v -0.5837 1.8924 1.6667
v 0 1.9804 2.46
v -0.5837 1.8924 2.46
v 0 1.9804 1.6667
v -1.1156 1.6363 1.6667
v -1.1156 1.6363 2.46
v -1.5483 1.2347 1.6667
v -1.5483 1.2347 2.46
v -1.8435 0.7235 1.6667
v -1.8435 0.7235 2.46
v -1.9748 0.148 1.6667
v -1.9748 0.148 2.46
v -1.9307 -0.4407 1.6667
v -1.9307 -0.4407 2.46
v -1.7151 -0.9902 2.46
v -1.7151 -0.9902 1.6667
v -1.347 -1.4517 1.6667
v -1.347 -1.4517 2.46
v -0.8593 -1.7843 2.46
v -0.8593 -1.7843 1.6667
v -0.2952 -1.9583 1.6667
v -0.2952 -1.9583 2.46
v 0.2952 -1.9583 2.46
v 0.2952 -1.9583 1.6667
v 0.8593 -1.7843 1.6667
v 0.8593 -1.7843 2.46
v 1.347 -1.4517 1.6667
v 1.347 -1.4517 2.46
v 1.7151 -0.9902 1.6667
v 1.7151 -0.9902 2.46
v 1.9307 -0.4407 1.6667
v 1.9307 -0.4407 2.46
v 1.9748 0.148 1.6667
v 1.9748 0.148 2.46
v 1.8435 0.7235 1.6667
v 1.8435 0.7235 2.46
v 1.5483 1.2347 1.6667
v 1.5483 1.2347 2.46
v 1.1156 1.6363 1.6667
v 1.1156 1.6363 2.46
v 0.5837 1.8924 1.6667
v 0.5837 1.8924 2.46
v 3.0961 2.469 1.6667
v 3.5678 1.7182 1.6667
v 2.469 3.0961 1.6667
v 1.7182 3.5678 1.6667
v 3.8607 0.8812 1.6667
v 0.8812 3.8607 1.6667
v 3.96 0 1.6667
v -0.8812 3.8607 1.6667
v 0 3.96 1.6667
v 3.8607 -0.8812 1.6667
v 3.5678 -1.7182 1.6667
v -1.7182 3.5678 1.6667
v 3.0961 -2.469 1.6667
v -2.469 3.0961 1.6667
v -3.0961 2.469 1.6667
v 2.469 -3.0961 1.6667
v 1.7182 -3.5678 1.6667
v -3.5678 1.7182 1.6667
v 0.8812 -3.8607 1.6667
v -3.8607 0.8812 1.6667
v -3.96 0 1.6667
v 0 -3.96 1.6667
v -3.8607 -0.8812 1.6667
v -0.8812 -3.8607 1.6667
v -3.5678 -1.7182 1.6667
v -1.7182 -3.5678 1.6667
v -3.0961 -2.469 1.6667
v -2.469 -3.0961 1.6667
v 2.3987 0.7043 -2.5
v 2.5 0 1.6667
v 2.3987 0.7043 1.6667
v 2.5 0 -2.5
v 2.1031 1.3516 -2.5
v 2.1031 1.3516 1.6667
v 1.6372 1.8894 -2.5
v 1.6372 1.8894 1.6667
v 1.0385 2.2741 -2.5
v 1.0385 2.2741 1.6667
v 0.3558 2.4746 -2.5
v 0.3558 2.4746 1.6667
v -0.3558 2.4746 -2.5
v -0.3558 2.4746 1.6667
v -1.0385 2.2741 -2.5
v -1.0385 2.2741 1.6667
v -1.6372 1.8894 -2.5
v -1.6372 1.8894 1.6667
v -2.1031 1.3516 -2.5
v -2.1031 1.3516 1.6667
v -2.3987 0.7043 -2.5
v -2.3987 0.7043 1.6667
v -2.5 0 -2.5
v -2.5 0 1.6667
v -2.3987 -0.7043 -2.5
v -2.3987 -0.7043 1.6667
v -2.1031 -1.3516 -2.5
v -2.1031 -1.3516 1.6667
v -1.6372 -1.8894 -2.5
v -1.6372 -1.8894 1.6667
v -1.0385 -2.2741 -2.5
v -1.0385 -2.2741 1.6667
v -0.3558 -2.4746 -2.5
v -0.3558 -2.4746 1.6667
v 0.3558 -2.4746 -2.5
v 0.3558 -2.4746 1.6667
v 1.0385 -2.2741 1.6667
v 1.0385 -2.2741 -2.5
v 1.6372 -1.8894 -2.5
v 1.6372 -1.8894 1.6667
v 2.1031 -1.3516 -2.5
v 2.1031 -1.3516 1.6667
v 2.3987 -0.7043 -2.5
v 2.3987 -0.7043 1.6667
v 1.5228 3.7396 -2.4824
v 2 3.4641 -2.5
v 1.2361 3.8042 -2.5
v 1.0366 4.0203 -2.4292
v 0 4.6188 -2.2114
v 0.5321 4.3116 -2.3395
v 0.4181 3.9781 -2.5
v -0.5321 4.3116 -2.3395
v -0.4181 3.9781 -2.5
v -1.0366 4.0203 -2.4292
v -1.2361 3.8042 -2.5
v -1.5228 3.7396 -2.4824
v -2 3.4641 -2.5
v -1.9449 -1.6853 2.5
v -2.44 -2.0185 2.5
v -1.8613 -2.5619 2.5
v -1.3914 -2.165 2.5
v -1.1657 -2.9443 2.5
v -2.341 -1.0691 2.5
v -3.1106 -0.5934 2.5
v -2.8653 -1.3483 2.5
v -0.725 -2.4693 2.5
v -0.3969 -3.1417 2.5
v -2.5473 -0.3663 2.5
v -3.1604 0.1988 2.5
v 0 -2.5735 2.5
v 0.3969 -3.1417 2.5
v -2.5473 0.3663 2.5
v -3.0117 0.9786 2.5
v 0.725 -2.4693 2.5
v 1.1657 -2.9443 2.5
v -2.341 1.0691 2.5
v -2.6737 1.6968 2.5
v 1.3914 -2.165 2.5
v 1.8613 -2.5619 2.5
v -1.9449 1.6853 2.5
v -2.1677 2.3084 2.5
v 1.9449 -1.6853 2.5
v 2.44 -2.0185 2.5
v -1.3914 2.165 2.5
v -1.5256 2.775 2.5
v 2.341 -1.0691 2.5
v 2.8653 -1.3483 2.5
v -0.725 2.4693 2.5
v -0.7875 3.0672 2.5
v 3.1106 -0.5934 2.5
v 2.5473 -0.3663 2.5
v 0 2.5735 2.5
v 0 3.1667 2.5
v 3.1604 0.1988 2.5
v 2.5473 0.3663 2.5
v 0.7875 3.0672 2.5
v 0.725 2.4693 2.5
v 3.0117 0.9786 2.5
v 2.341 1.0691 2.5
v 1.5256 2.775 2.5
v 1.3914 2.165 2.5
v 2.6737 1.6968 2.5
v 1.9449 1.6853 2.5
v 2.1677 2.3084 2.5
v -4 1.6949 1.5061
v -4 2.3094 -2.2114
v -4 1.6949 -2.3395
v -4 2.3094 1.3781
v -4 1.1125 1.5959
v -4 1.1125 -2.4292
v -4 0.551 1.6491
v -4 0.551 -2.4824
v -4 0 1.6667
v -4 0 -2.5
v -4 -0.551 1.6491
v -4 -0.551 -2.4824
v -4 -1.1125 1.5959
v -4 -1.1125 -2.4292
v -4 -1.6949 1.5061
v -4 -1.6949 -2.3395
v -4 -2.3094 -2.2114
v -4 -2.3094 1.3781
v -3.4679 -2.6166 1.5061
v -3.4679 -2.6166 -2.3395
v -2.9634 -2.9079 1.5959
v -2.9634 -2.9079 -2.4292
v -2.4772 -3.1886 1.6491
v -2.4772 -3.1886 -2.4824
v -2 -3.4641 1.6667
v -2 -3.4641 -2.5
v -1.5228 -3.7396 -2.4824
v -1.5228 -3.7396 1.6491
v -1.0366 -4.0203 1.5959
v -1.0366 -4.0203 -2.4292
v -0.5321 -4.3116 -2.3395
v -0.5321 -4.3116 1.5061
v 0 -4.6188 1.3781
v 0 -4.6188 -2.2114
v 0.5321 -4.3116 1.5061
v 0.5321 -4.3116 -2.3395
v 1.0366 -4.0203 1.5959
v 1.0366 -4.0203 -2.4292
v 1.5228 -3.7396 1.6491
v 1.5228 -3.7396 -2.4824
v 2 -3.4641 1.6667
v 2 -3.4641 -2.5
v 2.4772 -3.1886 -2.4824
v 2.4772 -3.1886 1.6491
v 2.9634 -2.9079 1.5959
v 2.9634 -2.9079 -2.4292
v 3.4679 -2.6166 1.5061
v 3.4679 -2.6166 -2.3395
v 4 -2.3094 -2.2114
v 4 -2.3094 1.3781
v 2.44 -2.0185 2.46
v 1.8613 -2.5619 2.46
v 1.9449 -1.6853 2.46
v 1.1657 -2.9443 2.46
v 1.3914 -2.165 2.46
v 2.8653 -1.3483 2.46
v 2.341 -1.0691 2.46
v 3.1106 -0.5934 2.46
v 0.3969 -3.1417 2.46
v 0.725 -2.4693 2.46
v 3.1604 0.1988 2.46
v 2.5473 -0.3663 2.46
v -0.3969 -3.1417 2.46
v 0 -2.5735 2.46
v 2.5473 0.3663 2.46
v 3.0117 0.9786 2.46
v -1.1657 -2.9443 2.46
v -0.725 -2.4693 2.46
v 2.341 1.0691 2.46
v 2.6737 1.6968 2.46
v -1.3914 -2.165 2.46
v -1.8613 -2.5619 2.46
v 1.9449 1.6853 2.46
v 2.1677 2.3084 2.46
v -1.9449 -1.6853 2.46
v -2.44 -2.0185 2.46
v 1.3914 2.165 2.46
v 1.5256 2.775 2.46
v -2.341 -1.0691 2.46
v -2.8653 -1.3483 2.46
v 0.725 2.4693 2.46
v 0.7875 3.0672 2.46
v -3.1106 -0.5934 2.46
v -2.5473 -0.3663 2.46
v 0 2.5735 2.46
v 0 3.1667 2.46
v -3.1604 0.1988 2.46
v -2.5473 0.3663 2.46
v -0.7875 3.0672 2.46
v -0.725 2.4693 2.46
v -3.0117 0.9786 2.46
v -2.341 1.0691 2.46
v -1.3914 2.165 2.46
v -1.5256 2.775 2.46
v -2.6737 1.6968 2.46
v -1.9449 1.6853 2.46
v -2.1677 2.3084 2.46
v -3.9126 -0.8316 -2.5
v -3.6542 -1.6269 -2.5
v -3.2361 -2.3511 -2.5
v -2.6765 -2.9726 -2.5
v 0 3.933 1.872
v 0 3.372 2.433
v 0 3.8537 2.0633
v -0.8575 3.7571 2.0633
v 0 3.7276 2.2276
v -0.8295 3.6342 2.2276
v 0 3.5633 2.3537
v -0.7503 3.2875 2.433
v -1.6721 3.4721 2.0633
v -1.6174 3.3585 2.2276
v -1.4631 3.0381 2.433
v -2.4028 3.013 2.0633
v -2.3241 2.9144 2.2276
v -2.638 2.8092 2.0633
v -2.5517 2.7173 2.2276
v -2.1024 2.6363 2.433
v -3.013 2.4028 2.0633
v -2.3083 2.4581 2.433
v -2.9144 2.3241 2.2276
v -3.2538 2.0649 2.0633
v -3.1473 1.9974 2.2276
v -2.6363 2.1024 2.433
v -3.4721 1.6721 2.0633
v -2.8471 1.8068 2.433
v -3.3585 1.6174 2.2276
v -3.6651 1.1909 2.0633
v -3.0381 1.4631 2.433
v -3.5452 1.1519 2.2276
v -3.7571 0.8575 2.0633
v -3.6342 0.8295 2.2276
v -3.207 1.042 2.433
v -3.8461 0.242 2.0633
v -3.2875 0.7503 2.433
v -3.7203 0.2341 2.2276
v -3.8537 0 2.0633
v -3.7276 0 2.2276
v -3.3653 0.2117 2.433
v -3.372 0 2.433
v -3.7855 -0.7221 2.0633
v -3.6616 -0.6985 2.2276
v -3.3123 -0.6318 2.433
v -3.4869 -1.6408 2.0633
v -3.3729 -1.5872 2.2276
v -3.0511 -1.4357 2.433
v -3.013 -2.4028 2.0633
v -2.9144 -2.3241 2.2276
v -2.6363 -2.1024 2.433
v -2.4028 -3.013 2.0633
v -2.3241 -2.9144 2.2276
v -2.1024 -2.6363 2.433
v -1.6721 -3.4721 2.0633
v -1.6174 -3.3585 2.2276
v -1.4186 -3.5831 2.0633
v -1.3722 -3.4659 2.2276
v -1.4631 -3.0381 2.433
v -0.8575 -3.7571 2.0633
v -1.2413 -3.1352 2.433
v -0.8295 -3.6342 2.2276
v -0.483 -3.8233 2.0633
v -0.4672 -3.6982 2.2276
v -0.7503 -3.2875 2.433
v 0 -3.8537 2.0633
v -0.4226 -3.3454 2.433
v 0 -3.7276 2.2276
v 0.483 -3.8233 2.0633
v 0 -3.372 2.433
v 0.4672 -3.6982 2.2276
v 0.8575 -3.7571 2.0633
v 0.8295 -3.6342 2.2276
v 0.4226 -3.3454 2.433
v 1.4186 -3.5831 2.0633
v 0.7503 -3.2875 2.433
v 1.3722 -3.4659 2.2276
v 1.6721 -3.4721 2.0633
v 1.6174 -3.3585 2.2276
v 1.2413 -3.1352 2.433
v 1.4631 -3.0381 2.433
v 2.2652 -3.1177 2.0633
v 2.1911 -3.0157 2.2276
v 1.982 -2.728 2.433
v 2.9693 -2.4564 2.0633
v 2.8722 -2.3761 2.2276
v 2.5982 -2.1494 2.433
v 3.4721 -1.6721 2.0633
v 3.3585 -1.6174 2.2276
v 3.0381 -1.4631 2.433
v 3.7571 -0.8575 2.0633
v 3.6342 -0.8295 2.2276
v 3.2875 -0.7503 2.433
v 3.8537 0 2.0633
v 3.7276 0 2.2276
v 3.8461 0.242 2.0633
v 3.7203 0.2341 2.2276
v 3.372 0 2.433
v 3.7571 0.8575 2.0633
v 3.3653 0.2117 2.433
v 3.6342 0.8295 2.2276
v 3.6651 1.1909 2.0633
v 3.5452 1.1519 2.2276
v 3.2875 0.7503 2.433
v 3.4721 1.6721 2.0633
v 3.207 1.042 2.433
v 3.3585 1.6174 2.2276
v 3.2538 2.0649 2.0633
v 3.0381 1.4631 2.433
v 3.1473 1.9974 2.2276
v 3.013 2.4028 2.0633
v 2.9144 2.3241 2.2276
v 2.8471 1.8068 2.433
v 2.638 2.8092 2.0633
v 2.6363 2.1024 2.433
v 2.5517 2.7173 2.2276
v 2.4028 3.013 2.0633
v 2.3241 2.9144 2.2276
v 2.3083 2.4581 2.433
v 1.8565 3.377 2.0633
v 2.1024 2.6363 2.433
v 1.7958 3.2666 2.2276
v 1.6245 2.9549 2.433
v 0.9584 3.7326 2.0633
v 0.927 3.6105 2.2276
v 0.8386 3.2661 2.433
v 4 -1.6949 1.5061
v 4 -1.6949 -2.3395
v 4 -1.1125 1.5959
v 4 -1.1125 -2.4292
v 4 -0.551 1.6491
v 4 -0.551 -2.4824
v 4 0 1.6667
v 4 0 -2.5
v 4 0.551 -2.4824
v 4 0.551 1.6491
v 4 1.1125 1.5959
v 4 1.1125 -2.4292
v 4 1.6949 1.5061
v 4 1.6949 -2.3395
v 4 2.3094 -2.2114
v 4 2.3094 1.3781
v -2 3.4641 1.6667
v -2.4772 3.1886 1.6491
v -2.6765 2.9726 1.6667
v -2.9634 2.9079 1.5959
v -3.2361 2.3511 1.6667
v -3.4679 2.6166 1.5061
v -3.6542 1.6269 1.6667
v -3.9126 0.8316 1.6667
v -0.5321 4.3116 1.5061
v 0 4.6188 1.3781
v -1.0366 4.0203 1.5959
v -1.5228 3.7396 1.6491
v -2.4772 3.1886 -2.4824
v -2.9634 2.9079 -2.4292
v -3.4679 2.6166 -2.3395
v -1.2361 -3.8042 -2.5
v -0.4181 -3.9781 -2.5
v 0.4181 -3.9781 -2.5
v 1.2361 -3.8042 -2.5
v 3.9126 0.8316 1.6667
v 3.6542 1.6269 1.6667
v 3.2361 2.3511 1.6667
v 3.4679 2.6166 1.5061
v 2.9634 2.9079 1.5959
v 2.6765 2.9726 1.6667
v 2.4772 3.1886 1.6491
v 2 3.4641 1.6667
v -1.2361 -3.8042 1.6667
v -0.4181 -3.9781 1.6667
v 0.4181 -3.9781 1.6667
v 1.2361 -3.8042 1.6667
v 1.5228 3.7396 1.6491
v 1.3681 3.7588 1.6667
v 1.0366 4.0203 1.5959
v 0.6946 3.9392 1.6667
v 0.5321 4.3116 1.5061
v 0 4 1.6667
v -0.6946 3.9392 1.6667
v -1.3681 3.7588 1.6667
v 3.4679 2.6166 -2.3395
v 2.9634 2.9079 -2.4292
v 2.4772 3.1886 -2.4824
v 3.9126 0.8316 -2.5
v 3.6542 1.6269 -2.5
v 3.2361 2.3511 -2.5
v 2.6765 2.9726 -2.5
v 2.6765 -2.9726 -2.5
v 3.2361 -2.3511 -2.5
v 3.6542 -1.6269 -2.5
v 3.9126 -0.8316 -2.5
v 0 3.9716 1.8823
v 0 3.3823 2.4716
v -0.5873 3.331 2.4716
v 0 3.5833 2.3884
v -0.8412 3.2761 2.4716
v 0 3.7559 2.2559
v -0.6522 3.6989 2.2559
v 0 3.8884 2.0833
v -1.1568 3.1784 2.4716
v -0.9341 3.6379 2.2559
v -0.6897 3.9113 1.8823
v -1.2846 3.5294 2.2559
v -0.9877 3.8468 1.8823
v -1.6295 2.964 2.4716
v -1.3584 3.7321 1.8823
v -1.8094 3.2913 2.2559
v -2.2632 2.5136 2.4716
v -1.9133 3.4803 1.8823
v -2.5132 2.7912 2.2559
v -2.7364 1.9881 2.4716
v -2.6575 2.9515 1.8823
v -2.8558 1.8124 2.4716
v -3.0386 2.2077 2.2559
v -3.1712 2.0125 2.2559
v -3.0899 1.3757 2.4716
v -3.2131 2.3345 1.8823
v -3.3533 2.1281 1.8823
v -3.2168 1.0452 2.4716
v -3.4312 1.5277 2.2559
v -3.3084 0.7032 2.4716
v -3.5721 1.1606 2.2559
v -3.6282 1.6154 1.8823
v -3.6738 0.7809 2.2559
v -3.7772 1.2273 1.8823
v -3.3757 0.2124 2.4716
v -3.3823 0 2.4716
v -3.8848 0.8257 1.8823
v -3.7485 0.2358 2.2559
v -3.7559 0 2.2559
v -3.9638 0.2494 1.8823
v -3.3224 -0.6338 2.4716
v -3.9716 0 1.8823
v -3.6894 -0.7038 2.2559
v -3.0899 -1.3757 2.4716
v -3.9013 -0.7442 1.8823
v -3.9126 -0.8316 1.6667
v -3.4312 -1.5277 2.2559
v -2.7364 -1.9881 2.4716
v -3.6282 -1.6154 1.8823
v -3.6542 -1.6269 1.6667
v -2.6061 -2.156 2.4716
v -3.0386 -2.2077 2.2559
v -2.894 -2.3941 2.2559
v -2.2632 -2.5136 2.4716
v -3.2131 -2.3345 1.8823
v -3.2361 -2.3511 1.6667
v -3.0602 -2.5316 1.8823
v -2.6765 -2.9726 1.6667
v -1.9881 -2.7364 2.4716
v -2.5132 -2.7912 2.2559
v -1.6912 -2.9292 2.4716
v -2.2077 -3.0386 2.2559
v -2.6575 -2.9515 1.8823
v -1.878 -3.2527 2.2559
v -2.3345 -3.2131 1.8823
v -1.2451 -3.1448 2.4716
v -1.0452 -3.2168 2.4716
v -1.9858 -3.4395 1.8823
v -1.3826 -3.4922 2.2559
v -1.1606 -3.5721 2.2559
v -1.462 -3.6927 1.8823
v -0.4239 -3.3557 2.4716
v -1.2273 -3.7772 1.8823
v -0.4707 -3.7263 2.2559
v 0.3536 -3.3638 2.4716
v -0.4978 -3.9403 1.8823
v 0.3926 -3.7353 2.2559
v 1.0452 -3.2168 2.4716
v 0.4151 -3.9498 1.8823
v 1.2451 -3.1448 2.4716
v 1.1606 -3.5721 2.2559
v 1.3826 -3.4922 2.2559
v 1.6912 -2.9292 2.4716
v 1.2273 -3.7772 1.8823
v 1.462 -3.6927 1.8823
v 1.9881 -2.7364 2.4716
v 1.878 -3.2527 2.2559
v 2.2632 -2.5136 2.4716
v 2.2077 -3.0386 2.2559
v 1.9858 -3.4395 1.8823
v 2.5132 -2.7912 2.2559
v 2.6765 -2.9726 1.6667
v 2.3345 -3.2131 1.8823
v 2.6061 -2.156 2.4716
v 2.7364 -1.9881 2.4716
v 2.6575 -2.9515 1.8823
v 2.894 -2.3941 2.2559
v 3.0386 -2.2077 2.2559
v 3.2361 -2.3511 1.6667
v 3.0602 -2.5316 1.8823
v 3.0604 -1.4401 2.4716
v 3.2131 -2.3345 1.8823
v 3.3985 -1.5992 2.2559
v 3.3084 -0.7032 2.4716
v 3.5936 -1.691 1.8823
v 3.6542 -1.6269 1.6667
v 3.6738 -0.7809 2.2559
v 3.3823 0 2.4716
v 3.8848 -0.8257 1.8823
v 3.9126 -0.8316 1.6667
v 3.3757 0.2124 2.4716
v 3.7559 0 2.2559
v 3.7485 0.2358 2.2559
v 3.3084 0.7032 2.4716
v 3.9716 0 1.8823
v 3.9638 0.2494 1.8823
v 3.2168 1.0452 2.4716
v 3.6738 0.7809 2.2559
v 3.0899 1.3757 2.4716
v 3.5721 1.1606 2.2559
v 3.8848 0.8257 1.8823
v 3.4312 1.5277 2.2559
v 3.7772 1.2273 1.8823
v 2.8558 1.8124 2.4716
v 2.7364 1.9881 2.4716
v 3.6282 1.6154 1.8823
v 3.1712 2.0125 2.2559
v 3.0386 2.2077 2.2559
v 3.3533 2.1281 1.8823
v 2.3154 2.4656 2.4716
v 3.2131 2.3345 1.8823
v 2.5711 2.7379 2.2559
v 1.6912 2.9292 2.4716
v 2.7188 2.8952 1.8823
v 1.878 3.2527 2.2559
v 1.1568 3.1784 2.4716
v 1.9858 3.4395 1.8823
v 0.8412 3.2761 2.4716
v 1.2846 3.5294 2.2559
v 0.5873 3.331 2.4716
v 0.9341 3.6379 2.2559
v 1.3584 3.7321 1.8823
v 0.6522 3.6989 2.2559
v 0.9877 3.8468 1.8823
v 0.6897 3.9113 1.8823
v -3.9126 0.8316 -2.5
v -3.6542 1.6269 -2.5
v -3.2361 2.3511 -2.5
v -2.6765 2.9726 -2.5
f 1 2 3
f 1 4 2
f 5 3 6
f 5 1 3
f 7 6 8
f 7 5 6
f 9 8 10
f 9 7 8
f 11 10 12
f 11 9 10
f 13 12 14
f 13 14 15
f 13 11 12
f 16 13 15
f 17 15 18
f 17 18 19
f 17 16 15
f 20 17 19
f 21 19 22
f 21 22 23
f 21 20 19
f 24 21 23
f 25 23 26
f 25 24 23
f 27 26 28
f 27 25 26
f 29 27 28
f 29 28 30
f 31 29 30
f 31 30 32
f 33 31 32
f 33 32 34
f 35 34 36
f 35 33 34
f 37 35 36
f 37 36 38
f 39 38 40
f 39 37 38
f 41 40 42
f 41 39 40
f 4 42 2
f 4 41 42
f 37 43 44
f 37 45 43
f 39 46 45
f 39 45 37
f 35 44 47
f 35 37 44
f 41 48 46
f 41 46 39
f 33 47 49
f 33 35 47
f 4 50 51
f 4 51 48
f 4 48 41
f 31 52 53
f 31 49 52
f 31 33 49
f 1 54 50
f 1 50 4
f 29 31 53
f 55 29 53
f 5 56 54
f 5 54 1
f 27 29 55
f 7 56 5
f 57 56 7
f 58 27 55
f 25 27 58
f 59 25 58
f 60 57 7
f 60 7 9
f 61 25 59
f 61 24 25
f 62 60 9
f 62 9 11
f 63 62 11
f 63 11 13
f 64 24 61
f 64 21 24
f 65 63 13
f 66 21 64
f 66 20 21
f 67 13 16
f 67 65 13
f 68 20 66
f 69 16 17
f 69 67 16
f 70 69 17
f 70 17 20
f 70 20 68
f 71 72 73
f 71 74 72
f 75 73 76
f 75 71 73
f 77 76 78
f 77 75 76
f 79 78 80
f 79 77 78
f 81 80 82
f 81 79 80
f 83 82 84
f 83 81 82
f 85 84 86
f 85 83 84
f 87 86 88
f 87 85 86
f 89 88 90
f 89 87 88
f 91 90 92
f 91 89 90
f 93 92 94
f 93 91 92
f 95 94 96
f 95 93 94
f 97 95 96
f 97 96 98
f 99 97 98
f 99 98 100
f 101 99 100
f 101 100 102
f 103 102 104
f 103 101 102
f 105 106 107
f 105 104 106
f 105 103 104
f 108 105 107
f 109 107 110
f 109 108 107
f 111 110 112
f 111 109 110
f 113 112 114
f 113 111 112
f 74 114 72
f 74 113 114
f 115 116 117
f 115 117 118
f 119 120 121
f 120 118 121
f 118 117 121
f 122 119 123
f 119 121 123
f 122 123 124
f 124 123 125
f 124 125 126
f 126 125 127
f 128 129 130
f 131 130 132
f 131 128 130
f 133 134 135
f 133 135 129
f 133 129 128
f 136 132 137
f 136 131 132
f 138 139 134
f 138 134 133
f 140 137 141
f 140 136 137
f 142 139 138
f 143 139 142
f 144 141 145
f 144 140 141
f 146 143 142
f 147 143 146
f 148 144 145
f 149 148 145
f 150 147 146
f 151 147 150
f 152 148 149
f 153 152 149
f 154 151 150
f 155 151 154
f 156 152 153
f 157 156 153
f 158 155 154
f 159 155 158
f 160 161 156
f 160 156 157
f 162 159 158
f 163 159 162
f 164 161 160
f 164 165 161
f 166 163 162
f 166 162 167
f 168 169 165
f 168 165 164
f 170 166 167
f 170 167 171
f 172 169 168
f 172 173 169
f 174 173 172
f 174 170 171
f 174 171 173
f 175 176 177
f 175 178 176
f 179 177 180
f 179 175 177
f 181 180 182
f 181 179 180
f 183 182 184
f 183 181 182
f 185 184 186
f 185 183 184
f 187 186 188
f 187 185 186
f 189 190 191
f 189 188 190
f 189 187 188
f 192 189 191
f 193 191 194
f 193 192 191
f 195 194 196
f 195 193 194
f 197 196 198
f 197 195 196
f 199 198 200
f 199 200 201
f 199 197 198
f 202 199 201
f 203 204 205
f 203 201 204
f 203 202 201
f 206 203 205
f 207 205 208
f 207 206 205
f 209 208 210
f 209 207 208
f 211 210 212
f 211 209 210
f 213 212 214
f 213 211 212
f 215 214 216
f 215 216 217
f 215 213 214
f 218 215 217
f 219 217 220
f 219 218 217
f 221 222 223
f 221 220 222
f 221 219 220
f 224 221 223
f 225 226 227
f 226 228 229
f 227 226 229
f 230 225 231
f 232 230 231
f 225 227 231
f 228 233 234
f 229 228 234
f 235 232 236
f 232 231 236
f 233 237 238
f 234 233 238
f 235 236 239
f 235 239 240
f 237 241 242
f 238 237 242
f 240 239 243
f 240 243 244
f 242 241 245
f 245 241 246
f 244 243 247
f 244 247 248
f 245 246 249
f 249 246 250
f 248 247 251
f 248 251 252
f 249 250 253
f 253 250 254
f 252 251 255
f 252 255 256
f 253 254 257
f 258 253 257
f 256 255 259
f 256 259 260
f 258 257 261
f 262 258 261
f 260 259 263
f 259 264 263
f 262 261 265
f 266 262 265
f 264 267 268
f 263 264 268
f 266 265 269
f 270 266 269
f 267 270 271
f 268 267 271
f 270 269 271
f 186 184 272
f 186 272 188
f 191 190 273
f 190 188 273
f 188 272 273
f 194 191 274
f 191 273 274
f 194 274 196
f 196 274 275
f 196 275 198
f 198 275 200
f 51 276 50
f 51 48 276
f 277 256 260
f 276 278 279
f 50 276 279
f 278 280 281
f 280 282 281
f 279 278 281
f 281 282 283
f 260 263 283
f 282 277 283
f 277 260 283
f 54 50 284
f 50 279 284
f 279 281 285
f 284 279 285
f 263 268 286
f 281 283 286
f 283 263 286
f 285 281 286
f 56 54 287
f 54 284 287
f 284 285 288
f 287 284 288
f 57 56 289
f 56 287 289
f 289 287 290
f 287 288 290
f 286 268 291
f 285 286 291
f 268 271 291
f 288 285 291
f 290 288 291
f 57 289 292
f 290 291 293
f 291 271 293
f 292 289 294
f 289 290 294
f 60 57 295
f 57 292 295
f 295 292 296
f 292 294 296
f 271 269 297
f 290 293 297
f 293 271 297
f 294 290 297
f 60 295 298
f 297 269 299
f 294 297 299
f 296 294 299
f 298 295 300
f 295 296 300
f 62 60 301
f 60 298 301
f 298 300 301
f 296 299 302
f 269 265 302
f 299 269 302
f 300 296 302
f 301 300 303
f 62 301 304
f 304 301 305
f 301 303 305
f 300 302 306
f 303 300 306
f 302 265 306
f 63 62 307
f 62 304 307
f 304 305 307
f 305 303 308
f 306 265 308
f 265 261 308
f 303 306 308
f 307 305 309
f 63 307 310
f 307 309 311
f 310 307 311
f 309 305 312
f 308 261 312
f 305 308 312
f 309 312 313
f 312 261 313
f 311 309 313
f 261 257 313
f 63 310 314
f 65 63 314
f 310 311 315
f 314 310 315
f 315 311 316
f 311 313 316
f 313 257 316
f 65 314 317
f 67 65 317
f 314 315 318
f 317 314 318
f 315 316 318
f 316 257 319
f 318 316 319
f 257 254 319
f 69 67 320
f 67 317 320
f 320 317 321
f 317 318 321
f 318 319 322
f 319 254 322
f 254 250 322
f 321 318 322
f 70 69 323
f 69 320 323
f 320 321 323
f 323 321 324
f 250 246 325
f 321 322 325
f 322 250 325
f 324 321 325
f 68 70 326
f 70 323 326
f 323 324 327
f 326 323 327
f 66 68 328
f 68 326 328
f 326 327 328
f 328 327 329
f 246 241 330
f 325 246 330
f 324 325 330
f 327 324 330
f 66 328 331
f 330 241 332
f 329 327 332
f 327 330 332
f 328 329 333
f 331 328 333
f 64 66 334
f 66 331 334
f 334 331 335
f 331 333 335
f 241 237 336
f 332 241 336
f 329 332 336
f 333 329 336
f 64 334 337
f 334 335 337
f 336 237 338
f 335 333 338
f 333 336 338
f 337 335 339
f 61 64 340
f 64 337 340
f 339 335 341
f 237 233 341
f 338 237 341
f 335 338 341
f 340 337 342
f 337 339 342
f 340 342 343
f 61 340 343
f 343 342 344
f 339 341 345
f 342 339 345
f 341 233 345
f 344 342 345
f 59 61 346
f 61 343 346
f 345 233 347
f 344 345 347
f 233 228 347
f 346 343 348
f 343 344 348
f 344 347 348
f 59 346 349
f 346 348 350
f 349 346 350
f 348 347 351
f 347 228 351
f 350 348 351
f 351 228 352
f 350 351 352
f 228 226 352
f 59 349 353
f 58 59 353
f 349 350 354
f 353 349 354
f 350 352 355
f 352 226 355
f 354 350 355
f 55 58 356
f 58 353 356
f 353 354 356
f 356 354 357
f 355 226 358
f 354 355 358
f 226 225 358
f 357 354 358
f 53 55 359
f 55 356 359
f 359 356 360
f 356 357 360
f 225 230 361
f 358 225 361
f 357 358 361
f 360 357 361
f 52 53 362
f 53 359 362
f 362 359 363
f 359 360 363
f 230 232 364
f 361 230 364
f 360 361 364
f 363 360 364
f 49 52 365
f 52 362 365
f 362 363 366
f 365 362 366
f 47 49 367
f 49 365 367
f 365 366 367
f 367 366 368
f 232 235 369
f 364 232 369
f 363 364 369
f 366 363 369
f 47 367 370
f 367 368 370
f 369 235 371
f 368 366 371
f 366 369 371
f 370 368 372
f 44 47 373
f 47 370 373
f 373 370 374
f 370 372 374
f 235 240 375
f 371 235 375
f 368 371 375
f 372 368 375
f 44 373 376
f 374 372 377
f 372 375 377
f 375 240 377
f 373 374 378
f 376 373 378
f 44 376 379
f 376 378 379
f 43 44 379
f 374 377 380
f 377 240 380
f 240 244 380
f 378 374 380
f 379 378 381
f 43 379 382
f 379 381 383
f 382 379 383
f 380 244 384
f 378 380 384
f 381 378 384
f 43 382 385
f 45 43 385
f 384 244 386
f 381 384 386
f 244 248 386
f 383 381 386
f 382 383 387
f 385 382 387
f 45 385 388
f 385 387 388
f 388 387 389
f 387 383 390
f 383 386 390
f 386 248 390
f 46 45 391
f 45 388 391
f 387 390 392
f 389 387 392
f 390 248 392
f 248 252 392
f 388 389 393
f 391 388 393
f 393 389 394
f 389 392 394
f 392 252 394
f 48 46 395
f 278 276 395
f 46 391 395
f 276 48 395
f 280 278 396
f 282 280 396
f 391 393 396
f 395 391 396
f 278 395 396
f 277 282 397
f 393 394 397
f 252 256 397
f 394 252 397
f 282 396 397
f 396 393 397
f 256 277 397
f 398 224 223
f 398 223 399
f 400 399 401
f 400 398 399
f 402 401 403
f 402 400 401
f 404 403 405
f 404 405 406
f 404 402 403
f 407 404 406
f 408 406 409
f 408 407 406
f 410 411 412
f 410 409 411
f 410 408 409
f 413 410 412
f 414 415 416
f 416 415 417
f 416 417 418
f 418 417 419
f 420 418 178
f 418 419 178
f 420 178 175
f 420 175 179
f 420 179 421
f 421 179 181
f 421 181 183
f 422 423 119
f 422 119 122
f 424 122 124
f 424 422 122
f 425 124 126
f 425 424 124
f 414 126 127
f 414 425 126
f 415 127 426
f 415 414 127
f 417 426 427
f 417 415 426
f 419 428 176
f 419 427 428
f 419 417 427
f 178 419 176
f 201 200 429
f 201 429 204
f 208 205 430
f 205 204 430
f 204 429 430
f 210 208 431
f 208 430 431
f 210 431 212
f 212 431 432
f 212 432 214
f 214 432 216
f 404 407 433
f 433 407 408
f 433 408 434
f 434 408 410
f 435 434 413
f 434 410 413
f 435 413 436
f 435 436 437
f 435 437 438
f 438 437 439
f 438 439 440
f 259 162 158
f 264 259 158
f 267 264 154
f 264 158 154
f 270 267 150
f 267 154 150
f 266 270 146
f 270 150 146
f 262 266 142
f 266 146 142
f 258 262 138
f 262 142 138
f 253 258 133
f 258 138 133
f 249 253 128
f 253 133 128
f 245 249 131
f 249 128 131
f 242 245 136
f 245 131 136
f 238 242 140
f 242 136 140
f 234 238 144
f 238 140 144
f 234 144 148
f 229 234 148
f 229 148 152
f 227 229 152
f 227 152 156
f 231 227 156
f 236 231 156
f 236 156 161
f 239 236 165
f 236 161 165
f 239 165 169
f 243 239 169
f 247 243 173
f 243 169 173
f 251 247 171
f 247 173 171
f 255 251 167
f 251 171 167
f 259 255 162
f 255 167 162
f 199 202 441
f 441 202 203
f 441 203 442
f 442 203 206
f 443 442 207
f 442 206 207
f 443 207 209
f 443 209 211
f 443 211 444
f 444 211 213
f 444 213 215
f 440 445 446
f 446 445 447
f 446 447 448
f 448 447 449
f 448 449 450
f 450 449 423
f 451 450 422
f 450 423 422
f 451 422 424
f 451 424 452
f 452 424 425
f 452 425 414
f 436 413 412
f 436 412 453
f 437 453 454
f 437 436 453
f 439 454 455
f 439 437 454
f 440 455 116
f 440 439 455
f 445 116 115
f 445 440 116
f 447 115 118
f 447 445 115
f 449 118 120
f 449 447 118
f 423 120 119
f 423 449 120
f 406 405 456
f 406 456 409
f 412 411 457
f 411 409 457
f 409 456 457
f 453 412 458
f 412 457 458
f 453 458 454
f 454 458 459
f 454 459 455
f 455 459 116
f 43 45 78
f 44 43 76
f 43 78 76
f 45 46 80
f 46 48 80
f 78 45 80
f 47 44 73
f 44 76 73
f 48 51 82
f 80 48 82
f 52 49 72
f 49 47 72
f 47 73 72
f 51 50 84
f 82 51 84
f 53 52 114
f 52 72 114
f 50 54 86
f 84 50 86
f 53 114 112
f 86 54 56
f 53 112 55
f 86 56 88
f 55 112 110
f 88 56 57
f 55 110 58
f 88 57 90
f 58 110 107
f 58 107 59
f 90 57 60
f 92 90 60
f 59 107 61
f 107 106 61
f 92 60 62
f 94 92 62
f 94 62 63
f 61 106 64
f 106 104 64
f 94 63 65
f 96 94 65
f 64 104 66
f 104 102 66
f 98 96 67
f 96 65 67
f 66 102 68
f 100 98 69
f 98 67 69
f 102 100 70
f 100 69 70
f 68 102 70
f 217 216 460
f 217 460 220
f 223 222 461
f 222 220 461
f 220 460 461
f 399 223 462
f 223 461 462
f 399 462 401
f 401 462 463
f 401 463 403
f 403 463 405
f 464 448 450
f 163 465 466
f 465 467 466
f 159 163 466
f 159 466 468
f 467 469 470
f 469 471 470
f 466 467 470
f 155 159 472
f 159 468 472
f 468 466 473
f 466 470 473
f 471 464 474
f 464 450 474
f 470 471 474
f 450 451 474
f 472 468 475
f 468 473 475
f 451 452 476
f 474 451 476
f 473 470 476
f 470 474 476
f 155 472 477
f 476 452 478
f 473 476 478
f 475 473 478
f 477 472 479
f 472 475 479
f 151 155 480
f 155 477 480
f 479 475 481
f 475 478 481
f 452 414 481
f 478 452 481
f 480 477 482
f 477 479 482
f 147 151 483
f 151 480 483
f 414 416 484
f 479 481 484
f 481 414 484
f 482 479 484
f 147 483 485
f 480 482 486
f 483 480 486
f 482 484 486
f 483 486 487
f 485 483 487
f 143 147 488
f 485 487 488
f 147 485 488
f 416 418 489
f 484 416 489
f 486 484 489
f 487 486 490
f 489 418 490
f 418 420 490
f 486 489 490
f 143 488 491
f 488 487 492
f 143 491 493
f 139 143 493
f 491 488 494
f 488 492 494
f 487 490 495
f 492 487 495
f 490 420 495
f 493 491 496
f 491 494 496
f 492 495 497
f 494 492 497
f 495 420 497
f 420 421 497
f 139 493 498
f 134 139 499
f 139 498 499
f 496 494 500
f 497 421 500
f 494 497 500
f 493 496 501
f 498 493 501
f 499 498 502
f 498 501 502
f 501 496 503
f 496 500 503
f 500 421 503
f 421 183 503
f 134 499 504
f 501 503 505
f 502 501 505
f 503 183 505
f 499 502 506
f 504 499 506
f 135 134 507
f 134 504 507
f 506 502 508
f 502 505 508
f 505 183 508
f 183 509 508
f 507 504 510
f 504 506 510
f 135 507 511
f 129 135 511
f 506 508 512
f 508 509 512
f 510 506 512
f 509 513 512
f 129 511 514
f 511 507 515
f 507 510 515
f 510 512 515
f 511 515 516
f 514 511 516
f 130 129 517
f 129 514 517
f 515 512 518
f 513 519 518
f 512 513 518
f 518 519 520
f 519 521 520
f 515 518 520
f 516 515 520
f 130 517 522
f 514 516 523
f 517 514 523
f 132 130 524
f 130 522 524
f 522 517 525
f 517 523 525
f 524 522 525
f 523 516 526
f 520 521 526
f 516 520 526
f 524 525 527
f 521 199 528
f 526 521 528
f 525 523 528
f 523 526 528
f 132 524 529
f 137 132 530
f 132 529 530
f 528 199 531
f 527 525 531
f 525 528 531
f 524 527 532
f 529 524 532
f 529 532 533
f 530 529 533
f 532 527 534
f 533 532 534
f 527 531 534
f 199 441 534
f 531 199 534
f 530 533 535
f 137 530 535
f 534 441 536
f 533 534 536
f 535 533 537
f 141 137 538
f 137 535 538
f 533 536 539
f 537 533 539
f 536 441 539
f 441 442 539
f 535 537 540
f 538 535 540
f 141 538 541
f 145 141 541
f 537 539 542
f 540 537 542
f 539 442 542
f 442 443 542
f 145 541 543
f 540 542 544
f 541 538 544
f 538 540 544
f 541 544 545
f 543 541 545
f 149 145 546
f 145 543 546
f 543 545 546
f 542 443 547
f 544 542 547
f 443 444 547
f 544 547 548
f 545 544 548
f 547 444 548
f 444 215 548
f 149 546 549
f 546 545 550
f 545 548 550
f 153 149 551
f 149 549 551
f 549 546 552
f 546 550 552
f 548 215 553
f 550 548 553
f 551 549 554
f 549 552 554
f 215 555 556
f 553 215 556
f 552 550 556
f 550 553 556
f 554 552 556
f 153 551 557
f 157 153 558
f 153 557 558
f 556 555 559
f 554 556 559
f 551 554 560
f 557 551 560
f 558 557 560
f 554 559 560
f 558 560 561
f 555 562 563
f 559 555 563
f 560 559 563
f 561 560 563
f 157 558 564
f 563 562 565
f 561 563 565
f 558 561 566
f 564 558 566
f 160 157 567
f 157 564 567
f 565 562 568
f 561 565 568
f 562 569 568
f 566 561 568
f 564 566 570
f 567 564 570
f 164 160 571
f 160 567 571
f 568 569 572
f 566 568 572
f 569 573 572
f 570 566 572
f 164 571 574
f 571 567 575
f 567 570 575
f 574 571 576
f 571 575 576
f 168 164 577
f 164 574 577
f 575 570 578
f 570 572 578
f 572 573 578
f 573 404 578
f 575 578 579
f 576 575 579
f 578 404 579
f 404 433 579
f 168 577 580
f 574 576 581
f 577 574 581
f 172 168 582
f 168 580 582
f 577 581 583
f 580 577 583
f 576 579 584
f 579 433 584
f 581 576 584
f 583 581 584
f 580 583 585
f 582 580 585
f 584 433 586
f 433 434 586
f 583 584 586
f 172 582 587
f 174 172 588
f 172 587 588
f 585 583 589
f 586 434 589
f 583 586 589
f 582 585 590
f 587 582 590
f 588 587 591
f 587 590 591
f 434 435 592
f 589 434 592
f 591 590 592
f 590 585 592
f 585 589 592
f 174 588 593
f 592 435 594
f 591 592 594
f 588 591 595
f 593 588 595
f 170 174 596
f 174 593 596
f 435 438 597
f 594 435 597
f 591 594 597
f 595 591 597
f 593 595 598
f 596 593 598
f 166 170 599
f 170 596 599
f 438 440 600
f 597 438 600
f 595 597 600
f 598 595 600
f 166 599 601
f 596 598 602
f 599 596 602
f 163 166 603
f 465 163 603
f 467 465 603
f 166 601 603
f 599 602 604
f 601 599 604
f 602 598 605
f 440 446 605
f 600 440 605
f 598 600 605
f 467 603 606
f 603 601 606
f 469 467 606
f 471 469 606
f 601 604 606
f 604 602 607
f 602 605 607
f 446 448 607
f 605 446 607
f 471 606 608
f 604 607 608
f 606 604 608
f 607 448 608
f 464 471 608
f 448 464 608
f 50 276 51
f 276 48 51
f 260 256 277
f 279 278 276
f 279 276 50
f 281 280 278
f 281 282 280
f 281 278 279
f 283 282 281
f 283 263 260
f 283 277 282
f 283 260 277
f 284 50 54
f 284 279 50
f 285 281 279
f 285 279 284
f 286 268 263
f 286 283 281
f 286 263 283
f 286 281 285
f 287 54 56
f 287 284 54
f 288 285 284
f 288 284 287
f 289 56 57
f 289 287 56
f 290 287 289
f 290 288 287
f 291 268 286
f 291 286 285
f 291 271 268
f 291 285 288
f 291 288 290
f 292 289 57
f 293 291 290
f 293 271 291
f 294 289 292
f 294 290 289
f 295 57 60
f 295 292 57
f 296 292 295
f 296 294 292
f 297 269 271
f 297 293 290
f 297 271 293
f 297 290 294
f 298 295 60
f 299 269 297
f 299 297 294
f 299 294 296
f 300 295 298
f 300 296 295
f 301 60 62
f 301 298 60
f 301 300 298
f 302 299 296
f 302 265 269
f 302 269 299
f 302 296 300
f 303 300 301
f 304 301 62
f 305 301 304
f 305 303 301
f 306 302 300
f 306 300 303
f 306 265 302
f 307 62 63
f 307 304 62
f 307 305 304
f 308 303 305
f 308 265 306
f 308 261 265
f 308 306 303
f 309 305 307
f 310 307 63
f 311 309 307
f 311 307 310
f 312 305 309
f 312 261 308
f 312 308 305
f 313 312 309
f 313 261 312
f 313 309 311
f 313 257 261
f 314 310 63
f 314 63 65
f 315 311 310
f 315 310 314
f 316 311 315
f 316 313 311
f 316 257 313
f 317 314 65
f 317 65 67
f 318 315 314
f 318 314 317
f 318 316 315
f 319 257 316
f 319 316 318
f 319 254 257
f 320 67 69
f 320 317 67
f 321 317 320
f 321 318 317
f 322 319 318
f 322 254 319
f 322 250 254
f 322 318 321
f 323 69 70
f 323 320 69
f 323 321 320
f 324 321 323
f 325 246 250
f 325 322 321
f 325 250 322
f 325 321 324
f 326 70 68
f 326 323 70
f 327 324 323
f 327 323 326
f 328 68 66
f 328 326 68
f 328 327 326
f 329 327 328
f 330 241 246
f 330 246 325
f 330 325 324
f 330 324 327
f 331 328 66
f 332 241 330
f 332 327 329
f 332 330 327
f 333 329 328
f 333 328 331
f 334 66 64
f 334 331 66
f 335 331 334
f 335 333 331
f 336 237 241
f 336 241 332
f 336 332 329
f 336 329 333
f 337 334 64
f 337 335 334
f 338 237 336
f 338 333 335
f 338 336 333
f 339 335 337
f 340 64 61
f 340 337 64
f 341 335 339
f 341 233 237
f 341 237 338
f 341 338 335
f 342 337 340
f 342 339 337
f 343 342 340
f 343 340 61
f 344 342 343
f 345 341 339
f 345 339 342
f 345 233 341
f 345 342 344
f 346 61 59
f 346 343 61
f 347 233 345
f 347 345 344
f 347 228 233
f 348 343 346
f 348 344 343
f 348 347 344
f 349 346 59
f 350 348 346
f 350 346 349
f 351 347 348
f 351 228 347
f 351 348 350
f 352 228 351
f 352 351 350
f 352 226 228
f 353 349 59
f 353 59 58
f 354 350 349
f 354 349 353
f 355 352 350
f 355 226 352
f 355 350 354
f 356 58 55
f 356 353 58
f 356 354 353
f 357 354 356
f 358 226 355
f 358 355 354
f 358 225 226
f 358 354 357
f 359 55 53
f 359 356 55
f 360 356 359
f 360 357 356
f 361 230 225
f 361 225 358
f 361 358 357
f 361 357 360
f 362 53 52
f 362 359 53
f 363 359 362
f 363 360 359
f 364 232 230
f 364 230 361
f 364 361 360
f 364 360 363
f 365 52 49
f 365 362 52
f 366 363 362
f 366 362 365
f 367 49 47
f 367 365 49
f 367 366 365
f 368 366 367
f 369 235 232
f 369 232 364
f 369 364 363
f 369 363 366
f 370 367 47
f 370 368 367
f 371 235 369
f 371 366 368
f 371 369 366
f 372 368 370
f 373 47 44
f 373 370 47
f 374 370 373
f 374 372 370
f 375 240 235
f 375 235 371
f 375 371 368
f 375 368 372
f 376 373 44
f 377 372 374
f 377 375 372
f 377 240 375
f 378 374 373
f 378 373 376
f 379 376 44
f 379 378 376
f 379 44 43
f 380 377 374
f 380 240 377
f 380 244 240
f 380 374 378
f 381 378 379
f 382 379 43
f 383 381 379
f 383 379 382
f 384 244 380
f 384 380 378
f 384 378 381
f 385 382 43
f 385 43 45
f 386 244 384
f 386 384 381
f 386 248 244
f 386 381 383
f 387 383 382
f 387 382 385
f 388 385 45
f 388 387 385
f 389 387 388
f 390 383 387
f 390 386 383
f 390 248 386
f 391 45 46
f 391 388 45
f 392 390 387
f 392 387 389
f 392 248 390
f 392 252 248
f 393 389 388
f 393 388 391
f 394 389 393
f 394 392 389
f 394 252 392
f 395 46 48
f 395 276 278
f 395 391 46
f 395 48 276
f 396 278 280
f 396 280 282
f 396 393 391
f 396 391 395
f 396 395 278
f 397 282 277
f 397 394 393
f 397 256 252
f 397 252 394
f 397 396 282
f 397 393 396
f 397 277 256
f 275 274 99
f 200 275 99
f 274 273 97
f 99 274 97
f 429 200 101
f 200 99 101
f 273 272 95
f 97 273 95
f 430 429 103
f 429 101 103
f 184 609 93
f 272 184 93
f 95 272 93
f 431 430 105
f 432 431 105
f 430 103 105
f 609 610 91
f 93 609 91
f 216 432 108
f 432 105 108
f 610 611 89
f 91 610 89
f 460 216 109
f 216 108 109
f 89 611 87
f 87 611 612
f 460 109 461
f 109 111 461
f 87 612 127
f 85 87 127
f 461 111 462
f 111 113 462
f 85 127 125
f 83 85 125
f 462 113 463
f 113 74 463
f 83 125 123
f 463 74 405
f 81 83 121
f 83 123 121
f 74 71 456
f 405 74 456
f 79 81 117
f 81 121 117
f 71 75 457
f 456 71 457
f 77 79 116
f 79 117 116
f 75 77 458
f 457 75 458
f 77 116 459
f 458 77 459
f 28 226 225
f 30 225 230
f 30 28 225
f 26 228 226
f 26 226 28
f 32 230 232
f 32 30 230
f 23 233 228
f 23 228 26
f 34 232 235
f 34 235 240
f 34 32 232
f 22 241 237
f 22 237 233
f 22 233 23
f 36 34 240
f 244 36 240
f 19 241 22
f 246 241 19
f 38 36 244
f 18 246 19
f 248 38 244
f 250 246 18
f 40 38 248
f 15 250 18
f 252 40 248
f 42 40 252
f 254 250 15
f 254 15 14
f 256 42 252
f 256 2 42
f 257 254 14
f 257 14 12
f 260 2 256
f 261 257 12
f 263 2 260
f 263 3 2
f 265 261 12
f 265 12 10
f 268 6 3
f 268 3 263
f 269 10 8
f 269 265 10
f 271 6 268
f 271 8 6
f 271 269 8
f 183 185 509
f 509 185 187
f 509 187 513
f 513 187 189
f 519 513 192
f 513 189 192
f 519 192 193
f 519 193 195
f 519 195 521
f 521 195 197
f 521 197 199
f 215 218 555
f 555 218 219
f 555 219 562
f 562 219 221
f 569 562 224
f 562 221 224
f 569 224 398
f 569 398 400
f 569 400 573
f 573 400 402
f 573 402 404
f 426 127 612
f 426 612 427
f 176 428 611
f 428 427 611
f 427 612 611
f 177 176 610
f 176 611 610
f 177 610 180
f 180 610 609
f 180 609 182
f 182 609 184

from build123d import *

# Parameters (mm, degrees)
SKETCH3_R           = 2.5
BOSS_EXTRUDE1_DEPTH = 2.5


with BuildPart() as part:
    # Sketch3 → Boss-Extrude1 (new, symmetric)
    with BuildSketch(Plane.XY):
        Polygon((0, -4.618802154), (4, -2.309401077), (4, 2.309401077), (0, 4.618802154), (-4, 2.309401077), (-4, -2.309401077), align=None)
        Circle(SKETCH3_R, mode=Mode.SUBTRACT)
    extrude(amount=BOSS_EXTRUDE1_DEPTH, both=True)

    # Sketch4 → Cut-Revolve1 (revolve, cut)
    with BuildSketch(Plane(origin=(0, 0, 0), x_dir=(0, 0, -1), z_dir=(1, 0, 0))):
        with BuildLine():
            Line((3.77, 5.888802154), (-3.77, 5.888802154))
            Line((-3.77, 5.888802154), (-3.77, 3.166666667))
            Line((-3.77, 3.166666667), (-2.5, 3.166666667))
            ThreePointArc((-2.5, 3.166666667), (-2.255922318, 3.755922318), (-1.666666667, 4))
            Line((-1.666666667, 4), (-1.378114484, 4.618802154))
            Line((-1.378114484, 4.618802154), (2.211447817, 4.618802154))
            Line((2.211447817, 4.618802154), (2.5, 4))
            Line((2.5, 4), (2.5, 0))
            Line((2.5, 0), (3.77, 0))
            Line((3.77, 0), (3.77, 5.888802154))
        make_face()
        with BuildLine():
            Line((-3.77, 2.573525712), (-3.77, 0))
            Line((-3.77, 0), (-1.666666667, 0))
            Line((-1.666666667, 0), (-1.666666667, 3.96))
            ThreePointArc((-1.666666667, 3.96), (-2.227638046, 3.727638046), (-2.46, 3.166666667))
            Line((-2.46, 3.166666667), (-2.46, 2.573525712))
            Line((-2.46, 2.573525712), (-3.77, 2.573525712))
        make_face()
    revolve(axis=Axis((0, 0, -2.5), (0, 0, 1)), mode=Mode.SUBTRACT)


with BuildPart() as body_2:
    # Sketch5 → Revolve1 (revolve)
    with BuildSketch(Plane(origin=(0, 0, 0), x_dir=(0, 0, -1), z_dir=(1, 0, 0))):
        with BuildLine():
            Line((-2.46, 3.166666667), (-2.46, 1.980384758))
            Line((-2.46, 1.980384758), (-1.666666667, 1.980384758))
            Line((-1.666666667, 1.980384758), (-1.666666667, 3.96))
            ThreePointArc((-1.666666667, 3.96), (-2.227638046, 3.727638046), (-2.46, 3.166666667))
        make_face()
    revolve(axis=Axis((0, 0, -2.5), (0, 0, 1)))


solid = Compound([part.part, body_2.part])
